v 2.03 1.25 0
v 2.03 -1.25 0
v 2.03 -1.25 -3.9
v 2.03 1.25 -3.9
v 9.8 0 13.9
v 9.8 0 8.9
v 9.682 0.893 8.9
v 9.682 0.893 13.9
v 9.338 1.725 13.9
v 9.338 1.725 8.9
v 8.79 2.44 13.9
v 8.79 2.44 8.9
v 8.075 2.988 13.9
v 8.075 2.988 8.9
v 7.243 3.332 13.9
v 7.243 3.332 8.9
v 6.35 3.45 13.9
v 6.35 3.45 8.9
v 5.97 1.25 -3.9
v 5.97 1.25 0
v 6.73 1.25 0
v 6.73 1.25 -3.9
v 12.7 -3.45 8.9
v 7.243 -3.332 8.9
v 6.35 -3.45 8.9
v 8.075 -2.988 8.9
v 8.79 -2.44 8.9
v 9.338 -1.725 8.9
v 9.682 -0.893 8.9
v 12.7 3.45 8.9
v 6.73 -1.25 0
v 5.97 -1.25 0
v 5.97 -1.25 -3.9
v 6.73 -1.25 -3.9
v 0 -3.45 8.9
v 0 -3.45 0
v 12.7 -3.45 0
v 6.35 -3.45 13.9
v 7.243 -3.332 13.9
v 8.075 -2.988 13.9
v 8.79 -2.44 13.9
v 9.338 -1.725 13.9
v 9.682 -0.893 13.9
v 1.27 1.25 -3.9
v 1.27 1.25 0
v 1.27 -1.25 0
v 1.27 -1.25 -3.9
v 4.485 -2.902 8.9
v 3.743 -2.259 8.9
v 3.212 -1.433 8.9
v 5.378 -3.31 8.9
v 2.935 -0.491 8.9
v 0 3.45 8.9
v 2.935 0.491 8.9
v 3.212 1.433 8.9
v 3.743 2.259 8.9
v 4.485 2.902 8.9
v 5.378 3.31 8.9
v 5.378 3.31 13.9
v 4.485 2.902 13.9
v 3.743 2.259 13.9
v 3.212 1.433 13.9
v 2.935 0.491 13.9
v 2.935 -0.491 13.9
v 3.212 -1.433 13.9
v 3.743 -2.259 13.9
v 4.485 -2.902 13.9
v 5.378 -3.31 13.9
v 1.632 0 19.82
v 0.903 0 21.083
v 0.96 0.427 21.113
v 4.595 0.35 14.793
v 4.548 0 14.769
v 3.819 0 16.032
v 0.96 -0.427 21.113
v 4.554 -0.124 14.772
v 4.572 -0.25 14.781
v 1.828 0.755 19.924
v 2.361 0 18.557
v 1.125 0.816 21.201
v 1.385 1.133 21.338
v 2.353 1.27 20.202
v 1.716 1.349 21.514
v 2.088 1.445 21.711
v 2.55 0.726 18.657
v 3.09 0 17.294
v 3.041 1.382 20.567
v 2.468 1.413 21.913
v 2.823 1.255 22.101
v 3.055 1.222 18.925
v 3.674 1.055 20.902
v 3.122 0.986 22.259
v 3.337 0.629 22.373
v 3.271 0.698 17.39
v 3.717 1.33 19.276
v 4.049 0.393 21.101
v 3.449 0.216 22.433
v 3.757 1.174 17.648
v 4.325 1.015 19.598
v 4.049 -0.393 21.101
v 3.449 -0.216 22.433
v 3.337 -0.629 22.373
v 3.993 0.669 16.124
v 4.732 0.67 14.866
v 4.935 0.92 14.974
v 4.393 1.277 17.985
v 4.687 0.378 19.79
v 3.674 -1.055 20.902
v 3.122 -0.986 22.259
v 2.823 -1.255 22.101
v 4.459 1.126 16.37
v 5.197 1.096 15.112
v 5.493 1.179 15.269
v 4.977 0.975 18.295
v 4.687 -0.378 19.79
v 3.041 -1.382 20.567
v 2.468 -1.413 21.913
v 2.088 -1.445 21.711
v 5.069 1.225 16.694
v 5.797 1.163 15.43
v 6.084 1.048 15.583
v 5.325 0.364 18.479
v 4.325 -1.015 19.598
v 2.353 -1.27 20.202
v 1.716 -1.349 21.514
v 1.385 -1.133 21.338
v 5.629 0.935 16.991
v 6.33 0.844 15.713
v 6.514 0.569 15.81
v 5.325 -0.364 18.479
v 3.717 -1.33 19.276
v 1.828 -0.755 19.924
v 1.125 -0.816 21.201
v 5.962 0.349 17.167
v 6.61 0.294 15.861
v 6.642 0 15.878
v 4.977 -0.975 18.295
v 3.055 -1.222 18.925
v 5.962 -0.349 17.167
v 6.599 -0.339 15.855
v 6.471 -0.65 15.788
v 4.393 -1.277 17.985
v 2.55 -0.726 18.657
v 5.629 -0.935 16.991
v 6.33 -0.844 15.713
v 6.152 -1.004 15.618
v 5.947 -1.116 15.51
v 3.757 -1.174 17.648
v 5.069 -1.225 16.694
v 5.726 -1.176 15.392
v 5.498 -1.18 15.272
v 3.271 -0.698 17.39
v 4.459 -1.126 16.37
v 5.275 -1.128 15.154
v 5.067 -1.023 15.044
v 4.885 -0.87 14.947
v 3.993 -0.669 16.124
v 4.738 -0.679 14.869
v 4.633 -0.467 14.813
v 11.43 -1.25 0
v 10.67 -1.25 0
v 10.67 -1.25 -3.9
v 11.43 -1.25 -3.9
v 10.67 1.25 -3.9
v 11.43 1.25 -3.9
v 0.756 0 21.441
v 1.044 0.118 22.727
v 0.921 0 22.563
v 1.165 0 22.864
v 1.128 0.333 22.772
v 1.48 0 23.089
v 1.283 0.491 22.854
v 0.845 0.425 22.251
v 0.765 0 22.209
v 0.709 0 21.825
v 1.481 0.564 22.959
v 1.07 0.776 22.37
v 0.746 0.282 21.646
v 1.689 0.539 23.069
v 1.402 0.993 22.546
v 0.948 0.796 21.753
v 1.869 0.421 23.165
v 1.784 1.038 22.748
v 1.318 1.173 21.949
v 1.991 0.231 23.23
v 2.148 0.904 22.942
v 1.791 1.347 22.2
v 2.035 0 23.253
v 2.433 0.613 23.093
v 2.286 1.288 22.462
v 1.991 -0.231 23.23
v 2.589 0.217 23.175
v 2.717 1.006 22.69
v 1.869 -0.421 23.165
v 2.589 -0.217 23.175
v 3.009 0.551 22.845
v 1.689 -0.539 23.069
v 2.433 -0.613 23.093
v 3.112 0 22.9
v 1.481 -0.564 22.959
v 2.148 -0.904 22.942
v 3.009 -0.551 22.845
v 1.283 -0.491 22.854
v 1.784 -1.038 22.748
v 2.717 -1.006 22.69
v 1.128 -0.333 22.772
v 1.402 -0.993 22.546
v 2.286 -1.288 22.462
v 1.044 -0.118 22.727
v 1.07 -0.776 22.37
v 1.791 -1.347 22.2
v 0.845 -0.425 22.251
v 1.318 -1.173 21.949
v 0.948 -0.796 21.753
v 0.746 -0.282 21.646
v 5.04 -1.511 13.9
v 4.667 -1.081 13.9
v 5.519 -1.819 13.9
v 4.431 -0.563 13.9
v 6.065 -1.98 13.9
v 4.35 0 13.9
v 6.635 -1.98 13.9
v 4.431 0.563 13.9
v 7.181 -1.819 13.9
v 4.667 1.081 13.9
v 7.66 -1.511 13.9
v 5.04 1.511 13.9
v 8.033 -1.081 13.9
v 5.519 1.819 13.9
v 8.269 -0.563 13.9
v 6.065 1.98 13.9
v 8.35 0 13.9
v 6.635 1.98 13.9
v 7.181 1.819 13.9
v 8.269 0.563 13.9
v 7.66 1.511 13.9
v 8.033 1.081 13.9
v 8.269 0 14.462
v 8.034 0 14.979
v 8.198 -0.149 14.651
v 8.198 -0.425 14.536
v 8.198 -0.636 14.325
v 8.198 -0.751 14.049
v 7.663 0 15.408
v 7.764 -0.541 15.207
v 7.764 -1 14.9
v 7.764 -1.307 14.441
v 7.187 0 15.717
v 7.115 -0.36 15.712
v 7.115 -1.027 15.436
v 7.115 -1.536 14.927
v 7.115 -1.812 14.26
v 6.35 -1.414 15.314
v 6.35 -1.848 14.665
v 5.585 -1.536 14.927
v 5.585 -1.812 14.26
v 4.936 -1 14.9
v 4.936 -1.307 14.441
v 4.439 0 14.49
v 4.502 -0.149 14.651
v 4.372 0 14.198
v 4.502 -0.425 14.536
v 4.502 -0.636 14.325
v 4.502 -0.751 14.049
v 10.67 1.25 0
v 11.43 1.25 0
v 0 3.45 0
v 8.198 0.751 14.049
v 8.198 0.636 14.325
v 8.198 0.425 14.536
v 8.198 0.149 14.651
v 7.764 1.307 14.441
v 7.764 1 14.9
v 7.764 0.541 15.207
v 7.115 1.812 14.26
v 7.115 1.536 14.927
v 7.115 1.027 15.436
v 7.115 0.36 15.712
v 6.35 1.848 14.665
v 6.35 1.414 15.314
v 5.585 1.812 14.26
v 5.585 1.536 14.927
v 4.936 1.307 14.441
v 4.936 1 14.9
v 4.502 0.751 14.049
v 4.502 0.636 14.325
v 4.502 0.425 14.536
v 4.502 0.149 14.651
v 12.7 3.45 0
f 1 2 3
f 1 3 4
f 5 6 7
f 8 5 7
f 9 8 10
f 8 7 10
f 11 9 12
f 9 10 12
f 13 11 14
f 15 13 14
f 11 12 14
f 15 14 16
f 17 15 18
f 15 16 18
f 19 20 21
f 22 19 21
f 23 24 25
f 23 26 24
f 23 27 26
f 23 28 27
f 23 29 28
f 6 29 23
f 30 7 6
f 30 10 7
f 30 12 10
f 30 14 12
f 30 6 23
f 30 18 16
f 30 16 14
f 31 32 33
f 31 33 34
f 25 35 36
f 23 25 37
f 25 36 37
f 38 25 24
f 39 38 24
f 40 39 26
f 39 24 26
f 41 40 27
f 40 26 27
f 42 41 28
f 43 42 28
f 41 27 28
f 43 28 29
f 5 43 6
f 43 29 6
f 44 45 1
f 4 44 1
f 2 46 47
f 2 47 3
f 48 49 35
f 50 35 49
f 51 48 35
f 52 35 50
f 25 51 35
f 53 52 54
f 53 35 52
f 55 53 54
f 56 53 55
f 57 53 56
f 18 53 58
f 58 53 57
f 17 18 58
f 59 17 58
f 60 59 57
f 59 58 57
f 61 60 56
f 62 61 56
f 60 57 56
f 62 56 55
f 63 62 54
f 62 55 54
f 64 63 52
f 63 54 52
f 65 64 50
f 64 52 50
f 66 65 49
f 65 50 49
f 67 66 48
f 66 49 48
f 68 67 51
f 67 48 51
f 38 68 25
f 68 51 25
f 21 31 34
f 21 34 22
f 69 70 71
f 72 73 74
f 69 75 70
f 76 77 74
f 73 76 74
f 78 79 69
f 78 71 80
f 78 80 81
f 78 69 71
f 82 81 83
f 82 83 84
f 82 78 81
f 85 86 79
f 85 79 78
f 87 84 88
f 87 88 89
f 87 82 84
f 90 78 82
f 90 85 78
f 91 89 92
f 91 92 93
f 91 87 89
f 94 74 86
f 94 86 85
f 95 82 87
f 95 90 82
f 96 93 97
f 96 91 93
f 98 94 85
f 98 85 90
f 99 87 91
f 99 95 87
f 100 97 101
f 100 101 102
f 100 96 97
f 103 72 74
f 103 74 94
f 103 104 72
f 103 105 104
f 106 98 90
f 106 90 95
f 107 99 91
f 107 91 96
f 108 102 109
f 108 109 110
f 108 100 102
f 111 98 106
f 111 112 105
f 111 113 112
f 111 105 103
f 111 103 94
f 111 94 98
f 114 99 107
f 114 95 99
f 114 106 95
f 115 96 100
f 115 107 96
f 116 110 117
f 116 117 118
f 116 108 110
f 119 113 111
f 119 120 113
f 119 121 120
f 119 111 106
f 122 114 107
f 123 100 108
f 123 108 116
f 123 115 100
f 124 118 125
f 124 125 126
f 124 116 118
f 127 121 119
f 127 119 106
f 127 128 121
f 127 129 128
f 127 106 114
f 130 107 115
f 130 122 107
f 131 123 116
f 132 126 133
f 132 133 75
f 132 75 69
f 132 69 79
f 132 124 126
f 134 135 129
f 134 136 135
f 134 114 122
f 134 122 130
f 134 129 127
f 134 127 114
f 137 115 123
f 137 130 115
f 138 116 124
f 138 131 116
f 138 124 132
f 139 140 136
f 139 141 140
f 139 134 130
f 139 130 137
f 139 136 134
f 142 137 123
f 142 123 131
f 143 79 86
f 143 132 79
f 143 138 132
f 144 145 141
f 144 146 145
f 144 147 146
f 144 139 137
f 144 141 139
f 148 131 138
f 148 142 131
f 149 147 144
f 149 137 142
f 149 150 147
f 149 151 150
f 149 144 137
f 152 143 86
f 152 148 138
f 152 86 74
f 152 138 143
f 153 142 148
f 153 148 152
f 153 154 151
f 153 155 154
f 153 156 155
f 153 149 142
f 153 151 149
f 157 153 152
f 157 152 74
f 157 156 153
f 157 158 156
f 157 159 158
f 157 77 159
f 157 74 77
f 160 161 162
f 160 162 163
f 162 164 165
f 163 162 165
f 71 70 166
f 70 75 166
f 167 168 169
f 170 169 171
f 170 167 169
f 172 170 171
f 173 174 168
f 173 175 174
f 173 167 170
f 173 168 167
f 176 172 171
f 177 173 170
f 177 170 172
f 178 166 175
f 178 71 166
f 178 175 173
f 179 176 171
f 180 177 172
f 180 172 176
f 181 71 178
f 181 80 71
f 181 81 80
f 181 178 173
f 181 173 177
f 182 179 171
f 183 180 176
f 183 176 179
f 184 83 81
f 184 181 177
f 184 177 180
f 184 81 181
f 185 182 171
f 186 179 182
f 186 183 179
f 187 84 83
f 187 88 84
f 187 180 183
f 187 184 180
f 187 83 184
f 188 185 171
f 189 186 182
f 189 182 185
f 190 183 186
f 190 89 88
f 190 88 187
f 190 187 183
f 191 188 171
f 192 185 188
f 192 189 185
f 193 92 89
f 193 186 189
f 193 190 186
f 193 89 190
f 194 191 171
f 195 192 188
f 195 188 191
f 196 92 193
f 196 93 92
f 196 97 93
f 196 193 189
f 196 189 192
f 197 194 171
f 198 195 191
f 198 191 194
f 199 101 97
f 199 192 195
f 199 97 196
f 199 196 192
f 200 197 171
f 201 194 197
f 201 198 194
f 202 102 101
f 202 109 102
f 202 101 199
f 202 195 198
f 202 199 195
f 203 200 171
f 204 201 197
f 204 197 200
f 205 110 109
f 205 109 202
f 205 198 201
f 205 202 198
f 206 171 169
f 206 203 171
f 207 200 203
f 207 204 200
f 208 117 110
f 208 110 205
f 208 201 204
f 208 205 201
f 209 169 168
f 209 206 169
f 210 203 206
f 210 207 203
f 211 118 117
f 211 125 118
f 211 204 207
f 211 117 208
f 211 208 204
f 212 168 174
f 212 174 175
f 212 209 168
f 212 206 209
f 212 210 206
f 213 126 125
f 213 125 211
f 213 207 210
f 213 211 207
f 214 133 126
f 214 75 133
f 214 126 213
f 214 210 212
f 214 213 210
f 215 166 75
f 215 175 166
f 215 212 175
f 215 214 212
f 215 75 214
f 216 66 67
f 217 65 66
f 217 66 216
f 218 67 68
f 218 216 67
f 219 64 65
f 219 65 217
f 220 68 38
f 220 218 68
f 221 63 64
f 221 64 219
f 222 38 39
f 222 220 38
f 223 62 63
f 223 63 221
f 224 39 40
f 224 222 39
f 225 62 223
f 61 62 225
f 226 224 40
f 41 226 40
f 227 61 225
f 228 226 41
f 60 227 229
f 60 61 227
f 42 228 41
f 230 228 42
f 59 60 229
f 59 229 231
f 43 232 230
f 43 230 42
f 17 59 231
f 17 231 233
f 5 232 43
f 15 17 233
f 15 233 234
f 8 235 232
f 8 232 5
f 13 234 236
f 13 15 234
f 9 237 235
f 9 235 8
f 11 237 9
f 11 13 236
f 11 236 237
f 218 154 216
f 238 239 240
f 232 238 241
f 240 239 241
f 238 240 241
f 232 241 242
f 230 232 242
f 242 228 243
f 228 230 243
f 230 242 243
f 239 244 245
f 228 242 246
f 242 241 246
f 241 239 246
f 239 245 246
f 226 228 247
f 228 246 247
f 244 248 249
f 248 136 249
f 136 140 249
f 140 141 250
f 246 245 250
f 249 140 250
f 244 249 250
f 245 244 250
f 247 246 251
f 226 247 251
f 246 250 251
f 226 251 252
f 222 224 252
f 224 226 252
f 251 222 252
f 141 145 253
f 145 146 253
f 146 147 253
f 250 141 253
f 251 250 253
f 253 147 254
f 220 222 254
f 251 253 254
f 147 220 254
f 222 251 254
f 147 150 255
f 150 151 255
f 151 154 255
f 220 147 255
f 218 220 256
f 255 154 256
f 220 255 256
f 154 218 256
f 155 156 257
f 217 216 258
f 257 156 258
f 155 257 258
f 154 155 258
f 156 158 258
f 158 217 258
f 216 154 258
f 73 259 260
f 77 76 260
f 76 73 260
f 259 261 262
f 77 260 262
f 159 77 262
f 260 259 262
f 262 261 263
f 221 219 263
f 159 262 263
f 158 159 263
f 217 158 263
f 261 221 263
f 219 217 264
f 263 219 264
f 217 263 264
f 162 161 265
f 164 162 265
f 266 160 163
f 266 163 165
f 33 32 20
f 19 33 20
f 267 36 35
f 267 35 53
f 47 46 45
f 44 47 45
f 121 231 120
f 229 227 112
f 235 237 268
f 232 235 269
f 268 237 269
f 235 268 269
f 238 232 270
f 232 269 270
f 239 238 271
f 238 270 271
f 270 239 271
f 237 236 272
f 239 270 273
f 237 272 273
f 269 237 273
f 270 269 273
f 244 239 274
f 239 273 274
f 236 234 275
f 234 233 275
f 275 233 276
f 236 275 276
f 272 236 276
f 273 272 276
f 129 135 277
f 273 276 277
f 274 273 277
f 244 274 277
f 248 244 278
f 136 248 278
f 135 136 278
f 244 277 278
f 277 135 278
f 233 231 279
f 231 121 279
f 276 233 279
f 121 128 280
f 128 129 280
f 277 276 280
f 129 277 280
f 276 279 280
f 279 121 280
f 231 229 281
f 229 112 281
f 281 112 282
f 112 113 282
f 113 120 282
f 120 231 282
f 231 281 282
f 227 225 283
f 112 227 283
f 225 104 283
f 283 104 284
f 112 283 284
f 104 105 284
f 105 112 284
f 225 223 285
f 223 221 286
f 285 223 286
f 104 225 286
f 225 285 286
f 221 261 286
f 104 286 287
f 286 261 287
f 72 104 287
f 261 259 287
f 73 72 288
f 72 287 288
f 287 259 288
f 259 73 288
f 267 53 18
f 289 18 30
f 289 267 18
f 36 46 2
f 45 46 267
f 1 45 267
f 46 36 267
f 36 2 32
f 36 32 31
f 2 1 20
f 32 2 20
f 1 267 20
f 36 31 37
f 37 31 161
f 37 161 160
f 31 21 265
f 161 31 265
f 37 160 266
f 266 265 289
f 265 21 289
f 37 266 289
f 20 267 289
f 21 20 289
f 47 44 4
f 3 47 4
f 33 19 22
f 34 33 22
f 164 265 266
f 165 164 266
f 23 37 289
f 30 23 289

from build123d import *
from build123d import SkipClean  # not in build123d's __all__

# Parameters (mm, degrees)
F0_W     = 12.7
F0_H     = 6.9
F1_DEPTH = 8.9
F3_DEPTH = 5
F8_W     = 0.76
F8_H     = 2.5
F9_DEPTH = 3.9


with BuildPart() as f1:
    # F0 (on Top) → F1 (new body)
    with BuildSketch(Plane.XY):
        with Locations((6.35, 0)):
            Rectangle(F0_W, F0_H)
    extrude(amount=F1_DEPTH)

    # F2 (on face) → F3 (join)
    with BuildSketch(Plane.XY.offset(8.9)):
        with BuildLine():
            ThreePointArc((6.35, -3.45), (8.7895183951, -2.4395183951), (9.8, 0))
            ThreePointArc((9.8, 0), (8.7895183951, 2.4395183951), (6.35, 3.45))
            ThreePointArc((6.35, 3.45), (2.9, 0), (6.35, -3.45))
        make_face()
    extrude(amount=F3_DEPTH)

    # F4 (on Front) → F5 (revolve)
    with BuildSketch(Plane.XZ):
        with BuildLine():
            Line((0.9029362769, 21.0829250706), (5.05, 13.9))
            Line((5.05, 13.9), (6.35, 13.9))
            Line((6.35, 13.9), (1.4796313262, 23.0890972887))
            ThreePointArc((1.4796313262, 23.0890972887), (0.7651079647, 22.2085198521), (0.9029362769, 21.0829250706))
        make_face()
    revolve(axis=Axis((3.9148156631, 0, 18.4945486443), (0.4683046802, 0, -0.883567047)))

    # F6 (on Front) → F7 (revolve)
    with BuildSketch(Plane.XZ):
        with BuildLine():
            ThreePointArc((8.35, 13.9), (6.35, 15.9), (4.35, 13.9))
            Line((4.35, 13.9), (8.35, 13.9))
        make_face()
    with SkipClean():  # cleaning this boolean's faces spoils the solid; the shape is the same uncleaned
        revolve(axis=Axis((6.35, 0, 13.9), (1, 0, 0)))

    # F8 (on Top) → F9 (join)
    with BuildSketch(Plane.XY):
        with Locations((1.65, 0)):
            Rectangle(F8_W, F8_H)
        with Locations((6.35, 0)):
            Rectangle(F8_W, F8_H)
        with Locations((11.05, 0)):
            Rectangle(F8_W, F8_H)
    with SkipClean():  # cleaning this boolean's faces spoils the solid; the shape is the same uncleaned
        extrude(amount=-F9_DEPTH)


solid = f1.part
